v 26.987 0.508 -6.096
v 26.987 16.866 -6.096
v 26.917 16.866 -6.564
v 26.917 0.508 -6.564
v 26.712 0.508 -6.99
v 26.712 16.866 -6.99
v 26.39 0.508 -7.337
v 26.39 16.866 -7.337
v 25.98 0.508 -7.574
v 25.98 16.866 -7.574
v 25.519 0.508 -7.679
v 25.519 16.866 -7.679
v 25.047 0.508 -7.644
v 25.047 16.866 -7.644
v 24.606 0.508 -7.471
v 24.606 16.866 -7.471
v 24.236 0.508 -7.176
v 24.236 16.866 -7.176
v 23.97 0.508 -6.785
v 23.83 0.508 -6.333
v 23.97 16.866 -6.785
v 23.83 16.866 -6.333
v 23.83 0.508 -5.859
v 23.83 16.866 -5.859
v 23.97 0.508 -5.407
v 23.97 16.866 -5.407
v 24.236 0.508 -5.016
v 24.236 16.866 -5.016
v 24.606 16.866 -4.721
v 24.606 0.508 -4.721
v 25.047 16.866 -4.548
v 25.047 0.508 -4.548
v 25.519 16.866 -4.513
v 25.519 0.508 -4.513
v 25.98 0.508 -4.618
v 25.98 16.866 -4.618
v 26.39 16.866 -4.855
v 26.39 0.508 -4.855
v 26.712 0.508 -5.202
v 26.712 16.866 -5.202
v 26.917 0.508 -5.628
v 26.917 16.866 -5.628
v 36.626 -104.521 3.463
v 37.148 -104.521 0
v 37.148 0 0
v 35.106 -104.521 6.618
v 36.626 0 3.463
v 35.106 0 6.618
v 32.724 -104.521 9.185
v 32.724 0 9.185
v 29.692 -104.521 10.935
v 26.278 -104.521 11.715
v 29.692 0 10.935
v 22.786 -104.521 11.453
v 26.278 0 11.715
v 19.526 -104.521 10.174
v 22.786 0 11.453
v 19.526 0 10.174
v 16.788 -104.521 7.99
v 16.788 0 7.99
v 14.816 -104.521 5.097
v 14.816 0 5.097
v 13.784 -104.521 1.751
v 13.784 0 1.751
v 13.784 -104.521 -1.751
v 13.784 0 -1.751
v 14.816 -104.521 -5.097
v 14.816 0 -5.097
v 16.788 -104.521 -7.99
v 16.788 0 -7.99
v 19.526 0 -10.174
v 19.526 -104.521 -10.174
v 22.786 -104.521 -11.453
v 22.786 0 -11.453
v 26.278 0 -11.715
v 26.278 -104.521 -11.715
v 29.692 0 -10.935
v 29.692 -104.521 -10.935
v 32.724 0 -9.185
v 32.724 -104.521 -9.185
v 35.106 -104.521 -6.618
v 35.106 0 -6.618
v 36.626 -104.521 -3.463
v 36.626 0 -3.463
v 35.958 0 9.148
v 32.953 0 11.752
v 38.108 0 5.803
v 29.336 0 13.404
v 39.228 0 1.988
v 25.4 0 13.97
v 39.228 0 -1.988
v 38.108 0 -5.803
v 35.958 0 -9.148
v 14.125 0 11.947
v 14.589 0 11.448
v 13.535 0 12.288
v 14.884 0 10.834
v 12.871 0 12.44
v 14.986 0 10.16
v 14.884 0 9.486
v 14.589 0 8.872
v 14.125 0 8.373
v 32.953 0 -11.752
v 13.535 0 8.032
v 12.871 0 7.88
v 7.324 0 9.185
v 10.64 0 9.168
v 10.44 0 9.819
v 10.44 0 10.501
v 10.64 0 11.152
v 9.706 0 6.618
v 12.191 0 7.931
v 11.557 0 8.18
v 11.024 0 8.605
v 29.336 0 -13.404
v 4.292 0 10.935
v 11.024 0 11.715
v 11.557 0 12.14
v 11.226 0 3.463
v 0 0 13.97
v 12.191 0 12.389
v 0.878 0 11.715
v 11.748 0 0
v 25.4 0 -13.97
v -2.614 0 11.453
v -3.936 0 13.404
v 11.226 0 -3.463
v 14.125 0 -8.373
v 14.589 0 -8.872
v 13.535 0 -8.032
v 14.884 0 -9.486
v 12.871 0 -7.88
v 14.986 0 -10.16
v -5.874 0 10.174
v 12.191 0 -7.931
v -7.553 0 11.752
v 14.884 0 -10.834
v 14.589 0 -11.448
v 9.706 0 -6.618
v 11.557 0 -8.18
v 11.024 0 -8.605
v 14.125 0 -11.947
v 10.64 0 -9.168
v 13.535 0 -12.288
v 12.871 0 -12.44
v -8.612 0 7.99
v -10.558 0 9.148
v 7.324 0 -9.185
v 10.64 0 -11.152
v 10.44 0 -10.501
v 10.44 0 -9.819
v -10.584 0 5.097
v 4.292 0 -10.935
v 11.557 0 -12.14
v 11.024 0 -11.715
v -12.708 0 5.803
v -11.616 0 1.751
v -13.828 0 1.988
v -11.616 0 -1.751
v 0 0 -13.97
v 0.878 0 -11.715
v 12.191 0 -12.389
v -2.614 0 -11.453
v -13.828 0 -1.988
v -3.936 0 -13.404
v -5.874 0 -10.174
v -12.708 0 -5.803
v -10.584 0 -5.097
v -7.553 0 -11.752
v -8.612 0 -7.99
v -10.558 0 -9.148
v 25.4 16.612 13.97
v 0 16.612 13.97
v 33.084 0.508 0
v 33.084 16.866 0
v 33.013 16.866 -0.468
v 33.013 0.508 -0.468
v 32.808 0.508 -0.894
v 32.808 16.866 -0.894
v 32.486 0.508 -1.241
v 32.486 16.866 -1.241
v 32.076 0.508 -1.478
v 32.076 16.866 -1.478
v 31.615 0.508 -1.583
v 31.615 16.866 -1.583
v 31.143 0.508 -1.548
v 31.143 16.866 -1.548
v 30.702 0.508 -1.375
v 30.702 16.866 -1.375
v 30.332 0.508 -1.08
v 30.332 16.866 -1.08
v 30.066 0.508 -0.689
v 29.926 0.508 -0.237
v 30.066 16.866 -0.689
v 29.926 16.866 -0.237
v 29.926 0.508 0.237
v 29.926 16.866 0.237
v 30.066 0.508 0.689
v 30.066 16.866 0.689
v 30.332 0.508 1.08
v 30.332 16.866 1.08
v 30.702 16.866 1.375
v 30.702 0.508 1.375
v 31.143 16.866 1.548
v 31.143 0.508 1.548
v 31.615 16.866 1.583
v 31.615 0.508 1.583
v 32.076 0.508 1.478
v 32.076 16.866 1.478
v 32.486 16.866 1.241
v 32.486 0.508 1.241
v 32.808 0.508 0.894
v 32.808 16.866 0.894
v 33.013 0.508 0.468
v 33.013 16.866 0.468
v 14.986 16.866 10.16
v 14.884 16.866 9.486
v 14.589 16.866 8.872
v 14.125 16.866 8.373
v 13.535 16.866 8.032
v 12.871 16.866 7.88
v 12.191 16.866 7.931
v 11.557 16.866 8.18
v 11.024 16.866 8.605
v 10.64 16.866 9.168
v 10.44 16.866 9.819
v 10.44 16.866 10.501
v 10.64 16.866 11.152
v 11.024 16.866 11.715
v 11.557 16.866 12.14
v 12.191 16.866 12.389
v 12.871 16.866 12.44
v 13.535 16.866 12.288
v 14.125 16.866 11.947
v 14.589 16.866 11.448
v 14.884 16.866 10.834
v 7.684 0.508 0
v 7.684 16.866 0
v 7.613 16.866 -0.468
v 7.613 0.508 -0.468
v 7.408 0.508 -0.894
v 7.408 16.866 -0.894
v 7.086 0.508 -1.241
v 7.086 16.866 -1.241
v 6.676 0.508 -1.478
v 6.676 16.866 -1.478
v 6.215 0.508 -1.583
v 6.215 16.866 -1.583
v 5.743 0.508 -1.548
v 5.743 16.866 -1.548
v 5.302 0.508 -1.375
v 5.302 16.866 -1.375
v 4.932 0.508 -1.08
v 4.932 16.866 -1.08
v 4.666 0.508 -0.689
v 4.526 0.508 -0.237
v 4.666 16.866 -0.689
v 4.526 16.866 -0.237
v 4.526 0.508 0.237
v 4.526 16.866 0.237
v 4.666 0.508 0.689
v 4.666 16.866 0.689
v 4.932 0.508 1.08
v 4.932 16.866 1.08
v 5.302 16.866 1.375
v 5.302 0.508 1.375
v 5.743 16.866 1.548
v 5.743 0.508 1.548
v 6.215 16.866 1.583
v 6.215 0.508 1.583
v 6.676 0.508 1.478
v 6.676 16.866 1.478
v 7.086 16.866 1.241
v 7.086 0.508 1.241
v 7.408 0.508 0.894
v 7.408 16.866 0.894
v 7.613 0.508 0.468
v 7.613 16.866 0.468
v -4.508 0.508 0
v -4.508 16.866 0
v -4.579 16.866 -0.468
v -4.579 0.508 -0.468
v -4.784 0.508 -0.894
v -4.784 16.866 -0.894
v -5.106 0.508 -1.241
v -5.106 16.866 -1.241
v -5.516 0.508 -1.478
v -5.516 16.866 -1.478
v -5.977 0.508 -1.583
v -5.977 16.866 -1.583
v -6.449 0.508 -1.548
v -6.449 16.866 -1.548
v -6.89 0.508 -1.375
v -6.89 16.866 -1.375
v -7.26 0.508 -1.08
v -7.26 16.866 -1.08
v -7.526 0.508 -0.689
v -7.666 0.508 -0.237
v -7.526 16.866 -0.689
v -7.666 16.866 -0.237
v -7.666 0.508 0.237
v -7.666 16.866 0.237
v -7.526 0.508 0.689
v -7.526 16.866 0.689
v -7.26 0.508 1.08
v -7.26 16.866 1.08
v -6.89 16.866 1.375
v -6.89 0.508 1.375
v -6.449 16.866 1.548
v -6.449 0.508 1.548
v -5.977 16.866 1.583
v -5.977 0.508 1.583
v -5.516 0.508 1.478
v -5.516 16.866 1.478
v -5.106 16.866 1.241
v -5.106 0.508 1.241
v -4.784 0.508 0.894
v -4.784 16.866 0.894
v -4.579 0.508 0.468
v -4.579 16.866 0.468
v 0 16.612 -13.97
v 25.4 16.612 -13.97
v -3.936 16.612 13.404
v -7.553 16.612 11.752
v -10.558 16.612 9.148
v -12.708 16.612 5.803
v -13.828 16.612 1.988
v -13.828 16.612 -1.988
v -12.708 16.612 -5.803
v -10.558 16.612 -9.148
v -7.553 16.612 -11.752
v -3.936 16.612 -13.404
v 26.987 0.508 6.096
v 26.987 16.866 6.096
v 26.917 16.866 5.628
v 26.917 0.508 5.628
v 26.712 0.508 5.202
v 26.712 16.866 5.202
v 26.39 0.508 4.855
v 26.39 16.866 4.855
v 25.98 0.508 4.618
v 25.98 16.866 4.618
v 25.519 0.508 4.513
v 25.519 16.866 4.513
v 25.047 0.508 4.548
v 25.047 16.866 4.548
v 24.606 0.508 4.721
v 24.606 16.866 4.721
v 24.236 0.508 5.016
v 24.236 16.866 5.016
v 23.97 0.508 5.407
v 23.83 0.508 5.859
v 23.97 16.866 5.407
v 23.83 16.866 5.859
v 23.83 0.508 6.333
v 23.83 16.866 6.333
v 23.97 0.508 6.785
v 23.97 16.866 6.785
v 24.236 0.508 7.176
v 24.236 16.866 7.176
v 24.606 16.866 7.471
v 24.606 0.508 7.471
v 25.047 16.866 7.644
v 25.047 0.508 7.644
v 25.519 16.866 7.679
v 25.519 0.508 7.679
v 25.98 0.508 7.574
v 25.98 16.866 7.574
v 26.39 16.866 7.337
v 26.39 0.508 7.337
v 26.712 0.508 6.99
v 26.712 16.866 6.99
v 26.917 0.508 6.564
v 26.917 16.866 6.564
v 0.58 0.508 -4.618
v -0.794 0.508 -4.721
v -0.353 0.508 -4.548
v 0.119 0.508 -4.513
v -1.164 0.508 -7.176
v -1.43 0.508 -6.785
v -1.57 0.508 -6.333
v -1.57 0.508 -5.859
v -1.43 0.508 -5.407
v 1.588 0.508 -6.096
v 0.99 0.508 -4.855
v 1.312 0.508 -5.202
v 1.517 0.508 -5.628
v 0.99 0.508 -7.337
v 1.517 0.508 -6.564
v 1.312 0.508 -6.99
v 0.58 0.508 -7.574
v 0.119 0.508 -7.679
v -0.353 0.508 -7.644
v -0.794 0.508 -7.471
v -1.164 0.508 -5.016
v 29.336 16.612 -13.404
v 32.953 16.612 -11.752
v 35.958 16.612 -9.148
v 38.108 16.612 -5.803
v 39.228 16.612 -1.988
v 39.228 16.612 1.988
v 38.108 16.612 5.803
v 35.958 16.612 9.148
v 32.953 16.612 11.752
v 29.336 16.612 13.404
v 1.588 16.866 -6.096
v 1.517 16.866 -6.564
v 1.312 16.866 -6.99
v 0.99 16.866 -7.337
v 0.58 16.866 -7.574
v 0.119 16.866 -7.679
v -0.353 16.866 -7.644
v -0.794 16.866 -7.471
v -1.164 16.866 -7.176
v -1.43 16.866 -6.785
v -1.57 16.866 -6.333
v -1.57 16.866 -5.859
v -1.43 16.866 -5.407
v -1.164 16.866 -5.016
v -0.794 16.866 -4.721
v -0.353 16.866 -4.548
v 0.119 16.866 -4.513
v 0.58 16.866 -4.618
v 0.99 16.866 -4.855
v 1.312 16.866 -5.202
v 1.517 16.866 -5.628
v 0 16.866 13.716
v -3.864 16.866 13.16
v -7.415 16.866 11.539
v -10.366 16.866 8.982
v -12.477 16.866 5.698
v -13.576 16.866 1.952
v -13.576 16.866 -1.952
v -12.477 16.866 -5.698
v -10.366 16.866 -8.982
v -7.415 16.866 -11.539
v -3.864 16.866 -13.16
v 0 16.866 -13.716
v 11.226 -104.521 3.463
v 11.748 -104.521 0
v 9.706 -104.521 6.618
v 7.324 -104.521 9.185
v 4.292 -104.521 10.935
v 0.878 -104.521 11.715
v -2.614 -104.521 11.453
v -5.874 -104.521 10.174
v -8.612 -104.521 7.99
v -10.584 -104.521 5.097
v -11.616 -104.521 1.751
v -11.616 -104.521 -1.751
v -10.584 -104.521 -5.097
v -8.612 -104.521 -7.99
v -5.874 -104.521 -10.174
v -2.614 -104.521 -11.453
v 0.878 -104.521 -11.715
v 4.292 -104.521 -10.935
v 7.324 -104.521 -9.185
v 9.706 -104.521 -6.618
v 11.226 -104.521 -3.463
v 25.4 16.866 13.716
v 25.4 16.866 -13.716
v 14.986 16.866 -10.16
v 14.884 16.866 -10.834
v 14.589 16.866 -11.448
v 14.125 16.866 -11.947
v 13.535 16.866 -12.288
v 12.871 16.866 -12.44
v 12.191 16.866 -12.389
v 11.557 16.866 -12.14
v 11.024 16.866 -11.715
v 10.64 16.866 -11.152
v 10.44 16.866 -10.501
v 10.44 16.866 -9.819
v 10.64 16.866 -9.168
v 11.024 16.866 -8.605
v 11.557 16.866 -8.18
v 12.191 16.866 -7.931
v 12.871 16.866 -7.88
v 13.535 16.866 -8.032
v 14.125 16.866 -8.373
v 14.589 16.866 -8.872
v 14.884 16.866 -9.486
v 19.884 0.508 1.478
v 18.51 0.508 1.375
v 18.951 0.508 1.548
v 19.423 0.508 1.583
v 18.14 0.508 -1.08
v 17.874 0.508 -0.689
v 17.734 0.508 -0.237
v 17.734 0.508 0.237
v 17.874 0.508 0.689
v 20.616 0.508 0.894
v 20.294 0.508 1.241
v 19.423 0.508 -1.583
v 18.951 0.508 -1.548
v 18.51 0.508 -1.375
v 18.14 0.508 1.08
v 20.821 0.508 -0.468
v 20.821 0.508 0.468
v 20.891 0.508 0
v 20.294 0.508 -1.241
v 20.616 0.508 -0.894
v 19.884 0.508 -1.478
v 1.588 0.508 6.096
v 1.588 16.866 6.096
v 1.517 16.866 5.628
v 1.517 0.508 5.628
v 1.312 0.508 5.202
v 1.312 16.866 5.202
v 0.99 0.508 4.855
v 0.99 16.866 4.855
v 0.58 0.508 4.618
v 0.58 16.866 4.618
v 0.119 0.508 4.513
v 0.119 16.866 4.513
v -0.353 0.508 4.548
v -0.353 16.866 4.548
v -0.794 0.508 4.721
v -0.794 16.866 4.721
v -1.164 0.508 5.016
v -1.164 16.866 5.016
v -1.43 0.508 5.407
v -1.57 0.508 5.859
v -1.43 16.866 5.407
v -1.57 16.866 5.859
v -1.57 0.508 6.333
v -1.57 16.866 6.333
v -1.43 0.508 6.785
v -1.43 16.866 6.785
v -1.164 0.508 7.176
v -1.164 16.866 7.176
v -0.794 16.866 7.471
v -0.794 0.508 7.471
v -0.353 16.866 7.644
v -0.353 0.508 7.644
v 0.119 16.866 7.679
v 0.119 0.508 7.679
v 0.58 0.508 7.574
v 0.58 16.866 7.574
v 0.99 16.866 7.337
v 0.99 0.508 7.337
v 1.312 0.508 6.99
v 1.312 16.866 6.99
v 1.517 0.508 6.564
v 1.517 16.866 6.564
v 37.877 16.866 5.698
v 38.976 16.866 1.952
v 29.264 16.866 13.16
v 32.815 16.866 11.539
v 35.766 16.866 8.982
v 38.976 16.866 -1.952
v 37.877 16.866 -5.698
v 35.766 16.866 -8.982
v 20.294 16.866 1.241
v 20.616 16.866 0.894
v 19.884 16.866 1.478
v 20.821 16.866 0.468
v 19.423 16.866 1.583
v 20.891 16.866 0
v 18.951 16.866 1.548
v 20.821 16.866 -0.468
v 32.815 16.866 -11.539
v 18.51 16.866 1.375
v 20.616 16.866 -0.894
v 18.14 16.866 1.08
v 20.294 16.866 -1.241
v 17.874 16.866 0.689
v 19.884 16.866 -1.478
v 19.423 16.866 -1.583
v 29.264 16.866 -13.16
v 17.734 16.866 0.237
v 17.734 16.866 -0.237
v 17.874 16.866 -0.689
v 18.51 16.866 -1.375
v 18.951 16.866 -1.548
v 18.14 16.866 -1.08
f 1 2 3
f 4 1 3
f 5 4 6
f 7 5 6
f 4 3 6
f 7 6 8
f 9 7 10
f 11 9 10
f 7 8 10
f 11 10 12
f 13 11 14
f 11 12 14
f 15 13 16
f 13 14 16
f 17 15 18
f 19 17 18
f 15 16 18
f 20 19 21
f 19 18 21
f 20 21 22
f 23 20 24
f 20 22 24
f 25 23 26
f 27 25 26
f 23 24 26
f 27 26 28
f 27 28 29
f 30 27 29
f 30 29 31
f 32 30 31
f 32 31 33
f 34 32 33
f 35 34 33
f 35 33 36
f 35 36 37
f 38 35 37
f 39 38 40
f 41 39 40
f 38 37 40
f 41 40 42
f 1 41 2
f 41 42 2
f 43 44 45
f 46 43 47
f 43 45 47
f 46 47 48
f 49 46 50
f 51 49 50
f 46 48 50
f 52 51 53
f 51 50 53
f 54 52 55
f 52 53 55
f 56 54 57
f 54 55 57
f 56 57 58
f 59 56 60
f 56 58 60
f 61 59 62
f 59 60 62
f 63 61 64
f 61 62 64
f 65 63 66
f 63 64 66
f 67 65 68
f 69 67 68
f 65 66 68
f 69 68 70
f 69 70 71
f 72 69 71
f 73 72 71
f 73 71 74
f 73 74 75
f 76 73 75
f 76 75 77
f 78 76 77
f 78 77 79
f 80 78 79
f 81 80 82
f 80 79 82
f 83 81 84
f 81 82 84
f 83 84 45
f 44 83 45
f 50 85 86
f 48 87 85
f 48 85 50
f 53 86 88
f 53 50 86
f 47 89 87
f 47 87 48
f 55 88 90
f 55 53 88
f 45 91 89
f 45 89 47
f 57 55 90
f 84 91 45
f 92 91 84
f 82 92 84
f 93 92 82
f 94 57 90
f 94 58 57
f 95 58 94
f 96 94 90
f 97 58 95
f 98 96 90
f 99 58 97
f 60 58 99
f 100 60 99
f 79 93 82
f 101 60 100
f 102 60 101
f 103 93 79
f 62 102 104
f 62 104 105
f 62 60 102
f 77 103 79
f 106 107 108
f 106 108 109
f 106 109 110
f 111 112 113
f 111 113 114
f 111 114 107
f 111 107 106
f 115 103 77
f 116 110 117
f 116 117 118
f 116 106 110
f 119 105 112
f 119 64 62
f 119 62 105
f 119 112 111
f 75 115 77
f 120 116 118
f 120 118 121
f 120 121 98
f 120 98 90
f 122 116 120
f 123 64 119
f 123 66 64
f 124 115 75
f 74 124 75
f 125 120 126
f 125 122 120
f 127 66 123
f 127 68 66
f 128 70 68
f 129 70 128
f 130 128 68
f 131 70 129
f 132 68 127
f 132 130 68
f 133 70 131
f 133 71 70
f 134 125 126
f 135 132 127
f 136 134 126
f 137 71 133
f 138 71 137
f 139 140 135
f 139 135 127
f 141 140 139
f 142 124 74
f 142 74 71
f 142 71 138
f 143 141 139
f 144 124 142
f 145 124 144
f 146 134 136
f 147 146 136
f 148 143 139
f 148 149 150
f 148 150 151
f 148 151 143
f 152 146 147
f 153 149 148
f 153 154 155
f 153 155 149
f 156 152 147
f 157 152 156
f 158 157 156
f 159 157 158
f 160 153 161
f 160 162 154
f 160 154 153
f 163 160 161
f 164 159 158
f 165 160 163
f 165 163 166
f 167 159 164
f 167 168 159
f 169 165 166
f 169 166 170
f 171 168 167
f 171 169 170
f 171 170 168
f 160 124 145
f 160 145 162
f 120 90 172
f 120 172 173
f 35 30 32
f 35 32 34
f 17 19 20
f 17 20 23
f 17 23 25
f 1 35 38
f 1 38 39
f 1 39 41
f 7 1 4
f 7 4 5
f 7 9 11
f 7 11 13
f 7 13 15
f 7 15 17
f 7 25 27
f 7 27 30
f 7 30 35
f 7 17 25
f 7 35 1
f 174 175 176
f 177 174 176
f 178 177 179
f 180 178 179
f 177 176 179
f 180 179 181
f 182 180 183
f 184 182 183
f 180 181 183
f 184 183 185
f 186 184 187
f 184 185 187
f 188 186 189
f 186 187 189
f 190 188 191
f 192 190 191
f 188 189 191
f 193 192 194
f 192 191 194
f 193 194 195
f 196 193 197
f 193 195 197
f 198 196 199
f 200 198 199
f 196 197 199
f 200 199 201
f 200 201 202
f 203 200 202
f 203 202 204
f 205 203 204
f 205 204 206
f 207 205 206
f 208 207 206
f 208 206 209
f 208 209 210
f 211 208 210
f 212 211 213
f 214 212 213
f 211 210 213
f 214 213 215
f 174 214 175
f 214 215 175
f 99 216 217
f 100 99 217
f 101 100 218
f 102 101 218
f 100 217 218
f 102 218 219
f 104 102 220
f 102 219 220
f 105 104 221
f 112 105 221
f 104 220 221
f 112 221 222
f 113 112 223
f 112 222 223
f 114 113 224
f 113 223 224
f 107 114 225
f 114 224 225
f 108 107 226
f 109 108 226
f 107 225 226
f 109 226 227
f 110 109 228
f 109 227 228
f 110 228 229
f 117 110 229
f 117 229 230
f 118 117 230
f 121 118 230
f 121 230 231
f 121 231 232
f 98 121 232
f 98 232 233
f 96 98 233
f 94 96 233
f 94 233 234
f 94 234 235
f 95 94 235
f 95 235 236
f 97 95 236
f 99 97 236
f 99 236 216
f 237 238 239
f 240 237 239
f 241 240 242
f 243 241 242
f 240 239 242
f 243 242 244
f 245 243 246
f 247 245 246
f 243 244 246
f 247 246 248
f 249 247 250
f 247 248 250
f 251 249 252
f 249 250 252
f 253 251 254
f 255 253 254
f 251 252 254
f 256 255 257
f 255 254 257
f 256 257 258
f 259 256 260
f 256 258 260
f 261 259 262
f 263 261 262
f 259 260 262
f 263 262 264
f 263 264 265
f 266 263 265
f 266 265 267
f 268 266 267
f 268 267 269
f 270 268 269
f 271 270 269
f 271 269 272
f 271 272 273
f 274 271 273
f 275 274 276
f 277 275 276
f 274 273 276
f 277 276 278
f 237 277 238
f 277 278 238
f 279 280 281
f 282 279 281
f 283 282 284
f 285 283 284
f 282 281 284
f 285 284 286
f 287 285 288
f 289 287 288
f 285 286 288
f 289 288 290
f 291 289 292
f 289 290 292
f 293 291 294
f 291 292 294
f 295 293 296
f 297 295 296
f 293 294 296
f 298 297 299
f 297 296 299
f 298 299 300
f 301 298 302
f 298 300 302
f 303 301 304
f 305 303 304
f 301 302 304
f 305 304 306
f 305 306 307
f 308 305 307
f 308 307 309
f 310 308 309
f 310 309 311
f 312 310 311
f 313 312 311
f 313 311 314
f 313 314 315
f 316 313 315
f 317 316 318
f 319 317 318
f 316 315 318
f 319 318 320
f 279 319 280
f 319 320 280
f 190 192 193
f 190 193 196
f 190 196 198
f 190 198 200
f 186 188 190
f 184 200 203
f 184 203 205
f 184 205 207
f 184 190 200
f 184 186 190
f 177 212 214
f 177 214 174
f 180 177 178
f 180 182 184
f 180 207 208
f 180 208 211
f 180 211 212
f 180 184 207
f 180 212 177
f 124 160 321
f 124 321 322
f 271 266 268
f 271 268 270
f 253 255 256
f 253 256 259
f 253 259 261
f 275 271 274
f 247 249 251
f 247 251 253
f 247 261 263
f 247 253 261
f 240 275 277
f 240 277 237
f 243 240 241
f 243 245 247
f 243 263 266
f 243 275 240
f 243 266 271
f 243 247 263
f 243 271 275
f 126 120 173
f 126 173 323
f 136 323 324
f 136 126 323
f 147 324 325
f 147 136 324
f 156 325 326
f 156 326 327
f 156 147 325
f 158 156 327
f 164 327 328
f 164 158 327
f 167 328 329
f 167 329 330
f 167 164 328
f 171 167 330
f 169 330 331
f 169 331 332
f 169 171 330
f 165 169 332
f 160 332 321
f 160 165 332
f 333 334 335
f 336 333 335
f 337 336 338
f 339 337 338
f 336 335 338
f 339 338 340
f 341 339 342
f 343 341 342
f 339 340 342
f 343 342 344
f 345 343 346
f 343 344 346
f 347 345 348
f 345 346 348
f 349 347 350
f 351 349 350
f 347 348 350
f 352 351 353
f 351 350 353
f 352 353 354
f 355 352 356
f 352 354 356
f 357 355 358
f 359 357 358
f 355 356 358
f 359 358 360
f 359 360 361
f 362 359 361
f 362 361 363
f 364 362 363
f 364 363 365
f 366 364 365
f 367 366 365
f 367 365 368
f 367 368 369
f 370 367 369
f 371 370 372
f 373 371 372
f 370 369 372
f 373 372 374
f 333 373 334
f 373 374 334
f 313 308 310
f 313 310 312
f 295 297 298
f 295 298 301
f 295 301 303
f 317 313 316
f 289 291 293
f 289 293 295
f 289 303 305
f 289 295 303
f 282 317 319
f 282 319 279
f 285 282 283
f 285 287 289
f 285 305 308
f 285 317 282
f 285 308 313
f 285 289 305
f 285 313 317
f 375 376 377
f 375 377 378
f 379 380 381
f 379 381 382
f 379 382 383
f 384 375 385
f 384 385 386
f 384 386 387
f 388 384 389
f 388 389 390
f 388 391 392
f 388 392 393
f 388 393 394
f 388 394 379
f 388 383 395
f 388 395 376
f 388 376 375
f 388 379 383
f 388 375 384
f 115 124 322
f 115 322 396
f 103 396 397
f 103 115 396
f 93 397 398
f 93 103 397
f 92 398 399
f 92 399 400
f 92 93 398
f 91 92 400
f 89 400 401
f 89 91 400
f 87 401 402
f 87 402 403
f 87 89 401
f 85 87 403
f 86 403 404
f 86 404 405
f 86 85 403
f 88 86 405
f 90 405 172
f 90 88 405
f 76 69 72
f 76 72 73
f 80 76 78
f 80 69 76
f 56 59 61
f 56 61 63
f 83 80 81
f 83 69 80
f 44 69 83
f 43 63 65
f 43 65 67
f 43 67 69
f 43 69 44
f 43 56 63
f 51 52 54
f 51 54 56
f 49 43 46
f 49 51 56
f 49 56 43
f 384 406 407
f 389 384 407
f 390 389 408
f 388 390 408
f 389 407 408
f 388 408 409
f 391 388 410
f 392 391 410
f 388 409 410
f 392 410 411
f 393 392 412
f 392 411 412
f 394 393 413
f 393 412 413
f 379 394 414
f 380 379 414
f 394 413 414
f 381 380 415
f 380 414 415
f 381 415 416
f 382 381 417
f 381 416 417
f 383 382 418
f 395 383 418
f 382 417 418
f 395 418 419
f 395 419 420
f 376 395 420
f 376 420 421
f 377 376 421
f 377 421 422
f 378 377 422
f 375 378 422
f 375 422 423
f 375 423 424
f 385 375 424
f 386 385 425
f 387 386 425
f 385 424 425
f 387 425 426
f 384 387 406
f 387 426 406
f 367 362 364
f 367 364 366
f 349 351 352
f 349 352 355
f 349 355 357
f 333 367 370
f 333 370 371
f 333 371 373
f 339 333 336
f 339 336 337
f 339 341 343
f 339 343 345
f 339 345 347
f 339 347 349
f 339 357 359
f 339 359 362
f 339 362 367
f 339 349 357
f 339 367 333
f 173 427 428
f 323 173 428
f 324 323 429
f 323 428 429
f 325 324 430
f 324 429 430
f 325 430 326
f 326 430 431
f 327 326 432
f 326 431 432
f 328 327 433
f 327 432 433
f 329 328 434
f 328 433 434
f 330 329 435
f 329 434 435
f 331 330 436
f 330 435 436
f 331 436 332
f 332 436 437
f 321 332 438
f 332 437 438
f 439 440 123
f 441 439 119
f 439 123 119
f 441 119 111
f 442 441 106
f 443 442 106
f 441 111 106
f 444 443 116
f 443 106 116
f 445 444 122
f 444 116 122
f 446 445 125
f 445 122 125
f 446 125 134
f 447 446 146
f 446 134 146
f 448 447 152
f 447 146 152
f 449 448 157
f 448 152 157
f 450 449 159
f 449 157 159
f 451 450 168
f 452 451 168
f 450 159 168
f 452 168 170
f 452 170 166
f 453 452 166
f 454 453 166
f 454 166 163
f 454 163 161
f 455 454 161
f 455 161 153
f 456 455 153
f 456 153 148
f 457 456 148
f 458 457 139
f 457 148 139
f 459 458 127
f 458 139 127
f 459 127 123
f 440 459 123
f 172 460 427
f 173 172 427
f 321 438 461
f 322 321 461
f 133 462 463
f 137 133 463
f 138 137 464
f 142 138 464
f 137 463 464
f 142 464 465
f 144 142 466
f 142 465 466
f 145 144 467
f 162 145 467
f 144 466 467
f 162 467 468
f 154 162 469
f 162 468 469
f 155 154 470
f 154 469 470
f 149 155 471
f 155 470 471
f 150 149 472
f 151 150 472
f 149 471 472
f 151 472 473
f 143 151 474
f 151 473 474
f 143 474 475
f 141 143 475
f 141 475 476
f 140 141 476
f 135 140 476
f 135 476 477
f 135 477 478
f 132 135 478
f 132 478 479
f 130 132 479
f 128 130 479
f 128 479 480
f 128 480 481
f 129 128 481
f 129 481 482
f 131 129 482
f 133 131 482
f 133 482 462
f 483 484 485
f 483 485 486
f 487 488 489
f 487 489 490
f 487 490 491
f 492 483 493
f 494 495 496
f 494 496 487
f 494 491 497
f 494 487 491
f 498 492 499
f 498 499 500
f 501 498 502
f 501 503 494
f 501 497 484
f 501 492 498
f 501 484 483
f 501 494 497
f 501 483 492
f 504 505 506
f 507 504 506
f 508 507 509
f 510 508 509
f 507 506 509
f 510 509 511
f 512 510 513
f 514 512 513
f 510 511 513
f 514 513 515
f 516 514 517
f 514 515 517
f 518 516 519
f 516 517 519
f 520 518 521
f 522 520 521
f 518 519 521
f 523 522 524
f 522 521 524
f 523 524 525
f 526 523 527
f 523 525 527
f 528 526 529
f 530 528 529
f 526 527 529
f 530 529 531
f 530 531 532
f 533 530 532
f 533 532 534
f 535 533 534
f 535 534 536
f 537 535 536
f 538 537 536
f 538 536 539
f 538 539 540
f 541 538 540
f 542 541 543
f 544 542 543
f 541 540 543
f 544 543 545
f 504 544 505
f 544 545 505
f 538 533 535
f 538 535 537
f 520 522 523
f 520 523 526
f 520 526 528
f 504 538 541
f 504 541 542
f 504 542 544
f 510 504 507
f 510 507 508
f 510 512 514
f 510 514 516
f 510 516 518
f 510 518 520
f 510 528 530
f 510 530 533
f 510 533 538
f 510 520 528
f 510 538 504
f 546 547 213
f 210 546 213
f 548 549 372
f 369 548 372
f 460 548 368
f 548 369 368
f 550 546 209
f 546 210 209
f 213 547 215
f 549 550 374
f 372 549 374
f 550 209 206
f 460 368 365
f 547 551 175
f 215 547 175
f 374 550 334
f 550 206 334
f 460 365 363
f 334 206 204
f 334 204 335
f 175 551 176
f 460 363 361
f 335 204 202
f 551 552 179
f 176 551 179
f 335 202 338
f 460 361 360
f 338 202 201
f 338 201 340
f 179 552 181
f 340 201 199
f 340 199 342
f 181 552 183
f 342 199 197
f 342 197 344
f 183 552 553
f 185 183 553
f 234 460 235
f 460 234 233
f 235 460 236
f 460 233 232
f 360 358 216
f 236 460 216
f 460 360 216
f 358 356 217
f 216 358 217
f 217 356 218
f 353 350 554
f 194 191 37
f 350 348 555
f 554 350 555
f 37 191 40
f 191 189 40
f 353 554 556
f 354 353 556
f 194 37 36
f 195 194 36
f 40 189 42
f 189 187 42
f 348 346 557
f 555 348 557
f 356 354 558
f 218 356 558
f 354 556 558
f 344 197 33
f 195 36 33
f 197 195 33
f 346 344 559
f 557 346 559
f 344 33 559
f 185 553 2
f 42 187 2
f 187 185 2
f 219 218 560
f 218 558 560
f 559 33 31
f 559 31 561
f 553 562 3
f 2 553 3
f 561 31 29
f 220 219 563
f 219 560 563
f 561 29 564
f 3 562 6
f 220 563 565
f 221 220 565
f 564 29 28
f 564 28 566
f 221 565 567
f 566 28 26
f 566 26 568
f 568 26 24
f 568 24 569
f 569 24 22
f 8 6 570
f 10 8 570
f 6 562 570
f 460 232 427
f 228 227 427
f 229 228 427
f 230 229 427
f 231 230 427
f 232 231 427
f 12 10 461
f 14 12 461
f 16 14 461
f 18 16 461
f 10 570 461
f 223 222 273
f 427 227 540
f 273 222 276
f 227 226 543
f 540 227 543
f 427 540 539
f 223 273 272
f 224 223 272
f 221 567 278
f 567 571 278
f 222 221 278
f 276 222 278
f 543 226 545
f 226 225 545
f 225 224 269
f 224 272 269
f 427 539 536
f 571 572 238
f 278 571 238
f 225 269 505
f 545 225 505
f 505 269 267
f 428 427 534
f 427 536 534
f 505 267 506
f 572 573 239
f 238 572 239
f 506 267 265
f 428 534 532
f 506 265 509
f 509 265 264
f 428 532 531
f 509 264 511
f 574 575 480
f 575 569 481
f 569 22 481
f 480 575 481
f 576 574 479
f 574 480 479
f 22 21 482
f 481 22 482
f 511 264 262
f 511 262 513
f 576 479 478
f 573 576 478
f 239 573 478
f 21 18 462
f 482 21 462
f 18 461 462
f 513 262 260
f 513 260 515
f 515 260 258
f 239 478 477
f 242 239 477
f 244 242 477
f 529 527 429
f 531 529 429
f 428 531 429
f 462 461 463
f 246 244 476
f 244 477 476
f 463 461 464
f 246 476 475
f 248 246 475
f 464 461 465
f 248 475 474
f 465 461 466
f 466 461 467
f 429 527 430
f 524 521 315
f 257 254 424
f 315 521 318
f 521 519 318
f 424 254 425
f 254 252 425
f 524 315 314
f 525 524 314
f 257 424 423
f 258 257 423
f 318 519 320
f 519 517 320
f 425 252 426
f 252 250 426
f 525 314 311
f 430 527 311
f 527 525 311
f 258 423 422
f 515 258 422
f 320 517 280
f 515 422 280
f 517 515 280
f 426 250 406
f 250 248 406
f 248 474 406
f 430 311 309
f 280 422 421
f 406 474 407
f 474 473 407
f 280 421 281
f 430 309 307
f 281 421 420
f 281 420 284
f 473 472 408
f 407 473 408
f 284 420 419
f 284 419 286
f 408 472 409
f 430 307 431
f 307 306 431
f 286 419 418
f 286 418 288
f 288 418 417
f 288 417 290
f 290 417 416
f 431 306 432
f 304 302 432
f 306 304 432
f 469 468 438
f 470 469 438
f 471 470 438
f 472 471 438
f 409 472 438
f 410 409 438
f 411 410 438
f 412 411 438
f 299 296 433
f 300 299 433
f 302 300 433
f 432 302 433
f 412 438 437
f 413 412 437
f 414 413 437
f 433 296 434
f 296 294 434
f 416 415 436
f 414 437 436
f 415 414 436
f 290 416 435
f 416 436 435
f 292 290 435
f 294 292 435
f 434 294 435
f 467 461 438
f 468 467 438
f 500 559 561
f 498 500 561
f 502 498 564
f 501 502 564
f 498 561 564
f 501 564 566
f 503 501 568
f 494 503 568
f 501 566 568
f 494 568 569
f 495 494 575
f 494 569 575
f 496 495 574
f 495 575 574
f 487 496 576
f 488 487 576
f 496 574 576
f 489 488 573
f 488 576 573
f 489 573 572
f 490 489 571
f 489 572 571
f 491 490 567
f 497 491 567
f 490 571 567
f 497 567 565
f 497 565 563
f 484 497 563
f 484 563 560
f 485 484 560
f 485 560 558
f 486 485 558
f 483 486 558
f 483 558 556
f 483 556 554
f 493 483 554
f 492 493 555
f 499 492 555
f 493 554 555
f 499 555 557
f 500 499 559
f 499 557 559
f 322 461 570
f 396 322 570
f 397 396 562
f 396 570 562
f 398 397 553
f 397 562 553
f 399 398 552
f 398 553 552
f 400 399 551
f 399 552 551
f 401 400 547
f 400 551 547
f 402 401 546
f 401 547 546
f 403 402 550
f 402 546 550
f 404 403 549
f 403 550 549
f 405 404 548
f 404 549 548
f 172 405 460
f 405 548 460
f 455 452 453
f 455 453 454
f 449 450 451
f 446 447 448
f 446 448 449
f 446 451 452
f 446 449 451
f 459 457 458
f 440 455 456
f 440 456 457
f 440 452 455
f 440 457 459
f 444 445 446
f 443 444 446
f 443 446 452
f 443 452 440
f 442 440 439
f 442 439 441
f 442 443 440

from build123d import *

# Parameters (mm, degrees)
BOSS_EXTRUDE1_DEPTH = 16.8656
CHAMFER1_SIZE       = 0.254
SKETCH2_R           = 11.7475
BOSS_EXTRUDE2_DEPTH = 104.521
SKETCH3_R           = 1.5875
CUT_EXTRUDE1_DEPTH  = 16.3576
SKETCH4_R           = 2.286
CUT_EXTRUDE2_DEPTH  = 122.3866


with BuildPart() as part:
    # Sketch1 → Boss-Extrude1 (new body)
    with BuildSketch(Plane(origin=(0, 0, 0), x_dir=(1, 0, 0), z_dir=(0, 1, 0))):
        with BuildLine():
            Line((0, 13.97), (25.4, 13.97))
            ThreePointArc((25.4, 13.97), (39.37, 0), (25.4, -13.97))
            Line((25.4, -13.97), (0, -13.97))
            ThreePointArc((0, -13.97), (-13.97, 0), (0, 13.97))
        make_face()
    extrude(amount=BOSS_EXTRUDE1_DEPTH)

    # Chamfer1
    chamfer1_edges = [part.edges().sort_by_distance(p)[0] for p in [
        (39.37, 16.8656, 0),
        (12.7, 16.8656, -13.97),
        (-13.97, 16.8656, 0),
        (12.7, 16.8656, 13.97),
    ]]
    chamfer(chamfer1_edges, length=CHAMFER1_SIZE)

    # Sketch2 → Boss-Extrude2 (add)
    with BuildSketch(Plane.XZ):
        Circle(SKETCH2_R)
        with Locations((25.4, 0)):
            Circle(SKETCH2_R)
    extrude(amount=BOSS_EXTRUDE2_DEPTH)

    # Sketch3 → Cut-Extrude1 (cut)
    with BuildSketch(Plane(origin=(0, 16.8656, 0), x_dir=(1, 0, 0), z_dir=(0, 1, 0))):
        with Locations((25.4, 6.096)):
            Circle(SKETCH3_R)
        with Locations((31.496, 0)):
            Circle(SKETCH3_R)
        with Locations((25.4, -6.096)):
            Circle(SKETCH3_R)
        with Locations((19.304, 0)):
            Circle(SKETCH3_R)
        with Locations((-6.096, 0)):
            Circle(SKETCH3_R)
        with Locations((6.096, 0)):
            Circle(SKETCH3_R)
        with Locations((0, -6.096)):
            Circle(SKETCH3_R)
        with Locations((0, 6.096)):
            Circle(SKETCH3_R)
    extrude(amount=-CUT_EXTRUDE1_DEPTH, mode=Mode.SUBTRACT)

    # Sketch4 → Cut-Extrude2 (cut, through all)
    with BuildSketch(Plane(origin=(0, 16.8656, 0), x_dir=(1, 0, 0), z_dir=(0, 1, 0))):
        with Locations((12.7, 10.16)):
            Circle(SKETCH4_R)
        with Locations((12.7, -10.16)):
            Circle(SKETCH4_R)
    extrude(amount=-CUT_EXTRUDE2_DEPTH, mode=Mode.SUBTRACT)


solid = part.part
